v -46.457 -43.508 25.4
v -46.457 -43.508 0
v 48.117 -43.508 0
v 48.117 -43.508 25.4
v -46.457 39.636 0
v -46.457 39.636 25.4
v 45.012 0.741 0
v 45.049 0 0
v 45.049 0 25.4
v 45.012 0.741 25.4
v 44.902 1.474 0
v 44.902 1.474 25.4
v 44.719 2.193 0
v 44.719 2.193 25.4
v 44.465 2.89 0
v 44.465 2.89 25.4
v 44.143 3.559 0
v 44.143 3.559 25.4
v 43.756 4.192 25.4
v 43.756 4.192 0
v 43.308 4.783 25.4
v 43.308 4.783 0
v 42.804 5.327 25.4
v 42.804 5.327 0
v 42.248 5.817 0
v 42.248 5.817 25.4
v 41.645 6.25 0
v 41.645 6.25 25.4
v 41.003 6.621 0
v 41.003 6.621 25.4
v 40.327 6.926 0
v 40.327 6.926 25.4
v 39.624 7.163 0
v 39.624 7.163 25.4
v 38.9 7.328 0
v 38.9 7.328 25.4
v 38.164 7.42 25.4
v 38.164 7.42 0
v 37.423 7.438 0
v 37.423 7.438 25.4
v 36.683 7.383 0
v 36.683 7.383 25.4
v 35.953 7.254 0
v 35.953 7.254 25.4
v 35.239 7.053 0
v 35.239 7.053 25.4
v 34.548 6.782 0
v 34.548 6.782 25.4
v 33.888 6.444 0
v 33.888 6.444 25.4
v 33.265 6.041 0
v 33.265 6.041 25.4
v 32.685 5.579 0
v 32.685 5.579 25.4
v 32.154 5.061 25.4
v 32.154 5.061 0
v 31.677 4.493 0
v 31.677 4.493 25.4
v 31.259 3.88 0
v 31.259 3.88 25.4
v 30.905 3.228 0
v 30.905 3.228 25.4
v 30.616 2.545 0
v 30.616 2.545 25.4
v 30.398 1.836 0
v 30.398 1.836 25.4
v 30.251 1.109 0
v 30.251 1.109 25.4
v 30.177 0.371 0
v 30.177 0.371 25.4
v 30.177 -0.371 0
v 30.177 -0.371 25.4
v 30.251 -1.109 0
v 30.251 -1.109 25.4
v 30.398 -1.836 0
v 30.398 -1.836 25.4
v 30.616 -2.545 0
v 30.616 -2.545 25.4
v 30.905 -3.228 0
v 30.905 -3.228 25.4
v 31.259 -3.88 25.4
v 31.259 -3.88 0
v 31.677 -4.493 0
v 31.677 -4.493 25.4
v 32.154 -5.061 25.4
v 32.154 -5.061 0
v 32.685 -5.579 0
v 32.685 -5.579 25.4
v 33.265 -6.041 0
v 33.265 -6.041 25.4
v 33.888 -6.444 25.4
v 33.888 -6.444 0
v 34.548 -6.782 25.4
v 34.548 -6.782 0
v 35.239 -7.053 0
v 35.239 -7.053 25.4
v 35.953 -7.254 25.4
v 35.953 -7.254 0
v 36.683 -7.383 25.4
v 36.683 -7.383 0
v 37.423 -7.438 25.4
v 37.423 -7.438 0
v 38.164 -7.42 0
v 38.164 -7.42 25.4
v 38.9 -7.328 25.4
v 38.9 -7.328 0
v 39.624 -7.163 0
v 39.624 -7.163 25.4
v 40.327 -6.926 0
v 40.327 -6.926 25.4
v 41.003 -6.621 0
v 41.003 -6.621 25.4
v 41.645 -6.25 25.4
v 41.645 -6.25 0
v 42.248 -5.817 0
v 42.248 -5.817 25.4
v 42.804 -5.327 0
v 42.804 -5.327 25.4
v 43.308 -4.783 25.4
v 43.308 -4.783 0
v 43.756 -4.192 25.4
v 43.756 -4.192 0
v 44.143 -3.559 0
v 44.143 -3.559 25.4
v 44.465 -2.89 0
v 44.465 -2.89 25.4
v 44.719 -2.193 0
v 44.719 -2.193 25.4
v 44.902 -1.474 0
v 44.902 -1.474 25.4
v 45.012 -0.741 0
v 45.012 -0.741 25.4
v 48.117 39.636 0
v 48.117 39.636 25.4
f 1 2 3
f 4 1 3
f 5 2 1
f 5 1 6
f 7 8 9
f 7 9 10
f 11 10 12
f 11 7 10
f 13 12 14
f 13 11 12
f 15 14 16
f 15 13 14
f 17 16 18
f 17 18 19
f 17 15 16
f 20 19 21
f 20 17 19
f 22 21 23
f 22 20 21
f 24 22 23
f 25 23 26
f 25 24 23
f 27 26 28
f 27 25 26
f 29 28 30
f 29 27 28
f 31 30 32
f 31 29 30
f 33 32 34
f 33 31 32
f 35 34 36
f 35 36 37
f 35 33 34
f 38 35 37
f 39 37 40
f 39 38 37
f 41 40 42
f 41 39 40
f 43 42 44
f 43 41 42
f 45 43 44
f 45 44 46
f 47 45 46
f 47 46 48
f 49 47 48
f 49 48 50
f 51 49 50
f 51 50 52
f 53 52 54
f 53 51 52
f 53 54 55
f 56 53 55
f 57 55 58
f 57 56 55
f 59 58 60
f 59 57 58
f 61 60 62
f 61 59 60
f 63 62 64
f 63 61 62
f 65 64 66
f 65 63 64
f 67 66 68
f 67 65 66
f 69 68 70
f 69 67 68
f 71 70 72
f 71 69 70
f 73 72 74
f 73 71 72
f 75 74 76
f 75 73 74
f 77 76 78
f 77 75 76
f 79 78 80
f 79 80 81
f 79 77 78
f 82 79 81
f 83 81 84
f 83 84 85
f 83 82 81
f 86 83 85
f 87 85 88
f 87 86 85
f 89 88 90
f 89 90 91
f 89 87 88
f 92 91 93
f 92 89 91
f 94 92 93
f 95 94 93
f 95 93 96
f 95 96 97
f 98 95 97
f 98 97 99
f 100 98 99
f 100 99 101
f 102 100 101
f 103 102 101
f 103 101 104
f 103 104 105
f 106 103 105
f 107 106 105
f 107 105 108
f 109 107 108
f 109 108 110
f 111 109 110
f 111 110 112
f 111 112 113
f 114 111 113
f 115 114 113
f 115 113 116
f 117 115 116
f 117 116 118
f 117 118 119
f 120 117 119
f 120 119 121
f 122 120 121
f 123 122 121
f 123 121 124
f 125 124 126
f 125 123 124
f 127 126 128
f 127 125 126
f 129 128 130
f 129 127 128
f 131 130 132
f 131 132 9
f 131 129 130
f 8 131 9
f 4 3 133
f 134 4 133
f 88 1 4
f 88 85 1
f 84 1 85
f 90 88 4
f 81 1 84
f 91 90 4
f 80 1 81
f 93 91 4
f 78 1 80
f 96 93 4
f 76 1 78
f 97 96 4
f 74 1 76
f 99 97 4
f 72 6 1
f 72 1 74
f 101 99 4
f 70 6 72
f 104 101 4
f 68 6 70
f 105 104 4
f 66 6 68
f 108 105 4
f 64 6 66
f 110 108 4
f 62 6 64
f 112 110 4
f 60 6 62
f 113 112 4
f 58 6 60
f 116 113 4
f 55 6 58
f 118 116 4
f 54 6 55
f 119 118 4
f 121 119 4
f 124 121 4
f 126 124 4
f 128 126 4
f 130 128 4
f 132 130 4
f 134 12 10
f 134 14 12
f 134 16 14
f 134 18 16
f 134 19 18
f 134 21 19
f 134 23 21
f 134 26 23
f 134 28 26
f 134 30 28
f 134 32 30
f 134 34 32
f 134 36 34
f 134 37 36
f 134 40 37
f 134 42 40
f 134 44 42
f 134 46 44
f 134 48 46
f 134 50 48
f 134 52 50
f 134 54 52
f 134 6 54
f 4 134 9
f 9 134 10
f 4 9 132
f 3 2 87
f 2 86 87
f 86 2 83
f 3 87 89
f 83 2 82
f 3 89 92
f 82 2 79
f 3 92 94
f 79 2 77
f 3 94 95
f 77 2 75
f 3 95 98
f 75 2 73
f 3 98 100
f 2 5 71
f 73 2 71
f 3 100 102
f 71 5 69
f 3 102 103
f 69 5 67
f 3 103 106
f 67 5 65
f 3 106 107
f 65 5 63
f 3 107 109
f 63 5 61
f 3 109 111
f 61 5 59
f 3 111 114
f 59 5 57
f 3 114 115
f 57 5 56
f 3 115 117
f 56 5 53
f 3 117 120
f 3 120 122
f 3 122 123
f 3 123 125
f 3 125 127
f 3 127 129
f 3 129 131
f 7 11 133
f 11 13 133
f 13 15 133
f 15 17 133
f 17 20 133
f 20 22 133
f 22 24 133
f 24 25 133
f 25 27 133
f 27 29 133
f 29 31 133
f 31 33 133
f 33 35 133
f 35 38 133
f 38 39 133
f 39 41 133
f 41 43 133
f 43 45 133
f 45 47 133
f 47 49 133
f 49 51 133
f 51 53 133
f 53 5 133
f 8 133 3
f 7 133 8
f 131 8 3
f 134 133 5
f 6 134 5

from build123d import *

# Parameters (mm, degrees)
F0_W     = 46.4574210346
F0_H     = 83.1440314651
F0_W_2   = 48.1166169047
F0_R     = 7.4407213522
F1_DEPTH = 25.4


with BuildPart() as f1:
    # F0 (on Top) → F1 (new body)
    with BuildSketch(Plane.XY):
        with Locations((-23.2287105173, -1.935724169)):
            Rectangle(F0_W, F0_H)
        with Locations((24.0583084524, -1.935724169)):
            Rectangle(F0_W_2, F0_H)
        with Locations((37.6083850861, 0)):
            Circle(F0_R, mode=Mode.SUBTRACT)
    extrude(amount=F1_DEPTH)


solid = f1.part
